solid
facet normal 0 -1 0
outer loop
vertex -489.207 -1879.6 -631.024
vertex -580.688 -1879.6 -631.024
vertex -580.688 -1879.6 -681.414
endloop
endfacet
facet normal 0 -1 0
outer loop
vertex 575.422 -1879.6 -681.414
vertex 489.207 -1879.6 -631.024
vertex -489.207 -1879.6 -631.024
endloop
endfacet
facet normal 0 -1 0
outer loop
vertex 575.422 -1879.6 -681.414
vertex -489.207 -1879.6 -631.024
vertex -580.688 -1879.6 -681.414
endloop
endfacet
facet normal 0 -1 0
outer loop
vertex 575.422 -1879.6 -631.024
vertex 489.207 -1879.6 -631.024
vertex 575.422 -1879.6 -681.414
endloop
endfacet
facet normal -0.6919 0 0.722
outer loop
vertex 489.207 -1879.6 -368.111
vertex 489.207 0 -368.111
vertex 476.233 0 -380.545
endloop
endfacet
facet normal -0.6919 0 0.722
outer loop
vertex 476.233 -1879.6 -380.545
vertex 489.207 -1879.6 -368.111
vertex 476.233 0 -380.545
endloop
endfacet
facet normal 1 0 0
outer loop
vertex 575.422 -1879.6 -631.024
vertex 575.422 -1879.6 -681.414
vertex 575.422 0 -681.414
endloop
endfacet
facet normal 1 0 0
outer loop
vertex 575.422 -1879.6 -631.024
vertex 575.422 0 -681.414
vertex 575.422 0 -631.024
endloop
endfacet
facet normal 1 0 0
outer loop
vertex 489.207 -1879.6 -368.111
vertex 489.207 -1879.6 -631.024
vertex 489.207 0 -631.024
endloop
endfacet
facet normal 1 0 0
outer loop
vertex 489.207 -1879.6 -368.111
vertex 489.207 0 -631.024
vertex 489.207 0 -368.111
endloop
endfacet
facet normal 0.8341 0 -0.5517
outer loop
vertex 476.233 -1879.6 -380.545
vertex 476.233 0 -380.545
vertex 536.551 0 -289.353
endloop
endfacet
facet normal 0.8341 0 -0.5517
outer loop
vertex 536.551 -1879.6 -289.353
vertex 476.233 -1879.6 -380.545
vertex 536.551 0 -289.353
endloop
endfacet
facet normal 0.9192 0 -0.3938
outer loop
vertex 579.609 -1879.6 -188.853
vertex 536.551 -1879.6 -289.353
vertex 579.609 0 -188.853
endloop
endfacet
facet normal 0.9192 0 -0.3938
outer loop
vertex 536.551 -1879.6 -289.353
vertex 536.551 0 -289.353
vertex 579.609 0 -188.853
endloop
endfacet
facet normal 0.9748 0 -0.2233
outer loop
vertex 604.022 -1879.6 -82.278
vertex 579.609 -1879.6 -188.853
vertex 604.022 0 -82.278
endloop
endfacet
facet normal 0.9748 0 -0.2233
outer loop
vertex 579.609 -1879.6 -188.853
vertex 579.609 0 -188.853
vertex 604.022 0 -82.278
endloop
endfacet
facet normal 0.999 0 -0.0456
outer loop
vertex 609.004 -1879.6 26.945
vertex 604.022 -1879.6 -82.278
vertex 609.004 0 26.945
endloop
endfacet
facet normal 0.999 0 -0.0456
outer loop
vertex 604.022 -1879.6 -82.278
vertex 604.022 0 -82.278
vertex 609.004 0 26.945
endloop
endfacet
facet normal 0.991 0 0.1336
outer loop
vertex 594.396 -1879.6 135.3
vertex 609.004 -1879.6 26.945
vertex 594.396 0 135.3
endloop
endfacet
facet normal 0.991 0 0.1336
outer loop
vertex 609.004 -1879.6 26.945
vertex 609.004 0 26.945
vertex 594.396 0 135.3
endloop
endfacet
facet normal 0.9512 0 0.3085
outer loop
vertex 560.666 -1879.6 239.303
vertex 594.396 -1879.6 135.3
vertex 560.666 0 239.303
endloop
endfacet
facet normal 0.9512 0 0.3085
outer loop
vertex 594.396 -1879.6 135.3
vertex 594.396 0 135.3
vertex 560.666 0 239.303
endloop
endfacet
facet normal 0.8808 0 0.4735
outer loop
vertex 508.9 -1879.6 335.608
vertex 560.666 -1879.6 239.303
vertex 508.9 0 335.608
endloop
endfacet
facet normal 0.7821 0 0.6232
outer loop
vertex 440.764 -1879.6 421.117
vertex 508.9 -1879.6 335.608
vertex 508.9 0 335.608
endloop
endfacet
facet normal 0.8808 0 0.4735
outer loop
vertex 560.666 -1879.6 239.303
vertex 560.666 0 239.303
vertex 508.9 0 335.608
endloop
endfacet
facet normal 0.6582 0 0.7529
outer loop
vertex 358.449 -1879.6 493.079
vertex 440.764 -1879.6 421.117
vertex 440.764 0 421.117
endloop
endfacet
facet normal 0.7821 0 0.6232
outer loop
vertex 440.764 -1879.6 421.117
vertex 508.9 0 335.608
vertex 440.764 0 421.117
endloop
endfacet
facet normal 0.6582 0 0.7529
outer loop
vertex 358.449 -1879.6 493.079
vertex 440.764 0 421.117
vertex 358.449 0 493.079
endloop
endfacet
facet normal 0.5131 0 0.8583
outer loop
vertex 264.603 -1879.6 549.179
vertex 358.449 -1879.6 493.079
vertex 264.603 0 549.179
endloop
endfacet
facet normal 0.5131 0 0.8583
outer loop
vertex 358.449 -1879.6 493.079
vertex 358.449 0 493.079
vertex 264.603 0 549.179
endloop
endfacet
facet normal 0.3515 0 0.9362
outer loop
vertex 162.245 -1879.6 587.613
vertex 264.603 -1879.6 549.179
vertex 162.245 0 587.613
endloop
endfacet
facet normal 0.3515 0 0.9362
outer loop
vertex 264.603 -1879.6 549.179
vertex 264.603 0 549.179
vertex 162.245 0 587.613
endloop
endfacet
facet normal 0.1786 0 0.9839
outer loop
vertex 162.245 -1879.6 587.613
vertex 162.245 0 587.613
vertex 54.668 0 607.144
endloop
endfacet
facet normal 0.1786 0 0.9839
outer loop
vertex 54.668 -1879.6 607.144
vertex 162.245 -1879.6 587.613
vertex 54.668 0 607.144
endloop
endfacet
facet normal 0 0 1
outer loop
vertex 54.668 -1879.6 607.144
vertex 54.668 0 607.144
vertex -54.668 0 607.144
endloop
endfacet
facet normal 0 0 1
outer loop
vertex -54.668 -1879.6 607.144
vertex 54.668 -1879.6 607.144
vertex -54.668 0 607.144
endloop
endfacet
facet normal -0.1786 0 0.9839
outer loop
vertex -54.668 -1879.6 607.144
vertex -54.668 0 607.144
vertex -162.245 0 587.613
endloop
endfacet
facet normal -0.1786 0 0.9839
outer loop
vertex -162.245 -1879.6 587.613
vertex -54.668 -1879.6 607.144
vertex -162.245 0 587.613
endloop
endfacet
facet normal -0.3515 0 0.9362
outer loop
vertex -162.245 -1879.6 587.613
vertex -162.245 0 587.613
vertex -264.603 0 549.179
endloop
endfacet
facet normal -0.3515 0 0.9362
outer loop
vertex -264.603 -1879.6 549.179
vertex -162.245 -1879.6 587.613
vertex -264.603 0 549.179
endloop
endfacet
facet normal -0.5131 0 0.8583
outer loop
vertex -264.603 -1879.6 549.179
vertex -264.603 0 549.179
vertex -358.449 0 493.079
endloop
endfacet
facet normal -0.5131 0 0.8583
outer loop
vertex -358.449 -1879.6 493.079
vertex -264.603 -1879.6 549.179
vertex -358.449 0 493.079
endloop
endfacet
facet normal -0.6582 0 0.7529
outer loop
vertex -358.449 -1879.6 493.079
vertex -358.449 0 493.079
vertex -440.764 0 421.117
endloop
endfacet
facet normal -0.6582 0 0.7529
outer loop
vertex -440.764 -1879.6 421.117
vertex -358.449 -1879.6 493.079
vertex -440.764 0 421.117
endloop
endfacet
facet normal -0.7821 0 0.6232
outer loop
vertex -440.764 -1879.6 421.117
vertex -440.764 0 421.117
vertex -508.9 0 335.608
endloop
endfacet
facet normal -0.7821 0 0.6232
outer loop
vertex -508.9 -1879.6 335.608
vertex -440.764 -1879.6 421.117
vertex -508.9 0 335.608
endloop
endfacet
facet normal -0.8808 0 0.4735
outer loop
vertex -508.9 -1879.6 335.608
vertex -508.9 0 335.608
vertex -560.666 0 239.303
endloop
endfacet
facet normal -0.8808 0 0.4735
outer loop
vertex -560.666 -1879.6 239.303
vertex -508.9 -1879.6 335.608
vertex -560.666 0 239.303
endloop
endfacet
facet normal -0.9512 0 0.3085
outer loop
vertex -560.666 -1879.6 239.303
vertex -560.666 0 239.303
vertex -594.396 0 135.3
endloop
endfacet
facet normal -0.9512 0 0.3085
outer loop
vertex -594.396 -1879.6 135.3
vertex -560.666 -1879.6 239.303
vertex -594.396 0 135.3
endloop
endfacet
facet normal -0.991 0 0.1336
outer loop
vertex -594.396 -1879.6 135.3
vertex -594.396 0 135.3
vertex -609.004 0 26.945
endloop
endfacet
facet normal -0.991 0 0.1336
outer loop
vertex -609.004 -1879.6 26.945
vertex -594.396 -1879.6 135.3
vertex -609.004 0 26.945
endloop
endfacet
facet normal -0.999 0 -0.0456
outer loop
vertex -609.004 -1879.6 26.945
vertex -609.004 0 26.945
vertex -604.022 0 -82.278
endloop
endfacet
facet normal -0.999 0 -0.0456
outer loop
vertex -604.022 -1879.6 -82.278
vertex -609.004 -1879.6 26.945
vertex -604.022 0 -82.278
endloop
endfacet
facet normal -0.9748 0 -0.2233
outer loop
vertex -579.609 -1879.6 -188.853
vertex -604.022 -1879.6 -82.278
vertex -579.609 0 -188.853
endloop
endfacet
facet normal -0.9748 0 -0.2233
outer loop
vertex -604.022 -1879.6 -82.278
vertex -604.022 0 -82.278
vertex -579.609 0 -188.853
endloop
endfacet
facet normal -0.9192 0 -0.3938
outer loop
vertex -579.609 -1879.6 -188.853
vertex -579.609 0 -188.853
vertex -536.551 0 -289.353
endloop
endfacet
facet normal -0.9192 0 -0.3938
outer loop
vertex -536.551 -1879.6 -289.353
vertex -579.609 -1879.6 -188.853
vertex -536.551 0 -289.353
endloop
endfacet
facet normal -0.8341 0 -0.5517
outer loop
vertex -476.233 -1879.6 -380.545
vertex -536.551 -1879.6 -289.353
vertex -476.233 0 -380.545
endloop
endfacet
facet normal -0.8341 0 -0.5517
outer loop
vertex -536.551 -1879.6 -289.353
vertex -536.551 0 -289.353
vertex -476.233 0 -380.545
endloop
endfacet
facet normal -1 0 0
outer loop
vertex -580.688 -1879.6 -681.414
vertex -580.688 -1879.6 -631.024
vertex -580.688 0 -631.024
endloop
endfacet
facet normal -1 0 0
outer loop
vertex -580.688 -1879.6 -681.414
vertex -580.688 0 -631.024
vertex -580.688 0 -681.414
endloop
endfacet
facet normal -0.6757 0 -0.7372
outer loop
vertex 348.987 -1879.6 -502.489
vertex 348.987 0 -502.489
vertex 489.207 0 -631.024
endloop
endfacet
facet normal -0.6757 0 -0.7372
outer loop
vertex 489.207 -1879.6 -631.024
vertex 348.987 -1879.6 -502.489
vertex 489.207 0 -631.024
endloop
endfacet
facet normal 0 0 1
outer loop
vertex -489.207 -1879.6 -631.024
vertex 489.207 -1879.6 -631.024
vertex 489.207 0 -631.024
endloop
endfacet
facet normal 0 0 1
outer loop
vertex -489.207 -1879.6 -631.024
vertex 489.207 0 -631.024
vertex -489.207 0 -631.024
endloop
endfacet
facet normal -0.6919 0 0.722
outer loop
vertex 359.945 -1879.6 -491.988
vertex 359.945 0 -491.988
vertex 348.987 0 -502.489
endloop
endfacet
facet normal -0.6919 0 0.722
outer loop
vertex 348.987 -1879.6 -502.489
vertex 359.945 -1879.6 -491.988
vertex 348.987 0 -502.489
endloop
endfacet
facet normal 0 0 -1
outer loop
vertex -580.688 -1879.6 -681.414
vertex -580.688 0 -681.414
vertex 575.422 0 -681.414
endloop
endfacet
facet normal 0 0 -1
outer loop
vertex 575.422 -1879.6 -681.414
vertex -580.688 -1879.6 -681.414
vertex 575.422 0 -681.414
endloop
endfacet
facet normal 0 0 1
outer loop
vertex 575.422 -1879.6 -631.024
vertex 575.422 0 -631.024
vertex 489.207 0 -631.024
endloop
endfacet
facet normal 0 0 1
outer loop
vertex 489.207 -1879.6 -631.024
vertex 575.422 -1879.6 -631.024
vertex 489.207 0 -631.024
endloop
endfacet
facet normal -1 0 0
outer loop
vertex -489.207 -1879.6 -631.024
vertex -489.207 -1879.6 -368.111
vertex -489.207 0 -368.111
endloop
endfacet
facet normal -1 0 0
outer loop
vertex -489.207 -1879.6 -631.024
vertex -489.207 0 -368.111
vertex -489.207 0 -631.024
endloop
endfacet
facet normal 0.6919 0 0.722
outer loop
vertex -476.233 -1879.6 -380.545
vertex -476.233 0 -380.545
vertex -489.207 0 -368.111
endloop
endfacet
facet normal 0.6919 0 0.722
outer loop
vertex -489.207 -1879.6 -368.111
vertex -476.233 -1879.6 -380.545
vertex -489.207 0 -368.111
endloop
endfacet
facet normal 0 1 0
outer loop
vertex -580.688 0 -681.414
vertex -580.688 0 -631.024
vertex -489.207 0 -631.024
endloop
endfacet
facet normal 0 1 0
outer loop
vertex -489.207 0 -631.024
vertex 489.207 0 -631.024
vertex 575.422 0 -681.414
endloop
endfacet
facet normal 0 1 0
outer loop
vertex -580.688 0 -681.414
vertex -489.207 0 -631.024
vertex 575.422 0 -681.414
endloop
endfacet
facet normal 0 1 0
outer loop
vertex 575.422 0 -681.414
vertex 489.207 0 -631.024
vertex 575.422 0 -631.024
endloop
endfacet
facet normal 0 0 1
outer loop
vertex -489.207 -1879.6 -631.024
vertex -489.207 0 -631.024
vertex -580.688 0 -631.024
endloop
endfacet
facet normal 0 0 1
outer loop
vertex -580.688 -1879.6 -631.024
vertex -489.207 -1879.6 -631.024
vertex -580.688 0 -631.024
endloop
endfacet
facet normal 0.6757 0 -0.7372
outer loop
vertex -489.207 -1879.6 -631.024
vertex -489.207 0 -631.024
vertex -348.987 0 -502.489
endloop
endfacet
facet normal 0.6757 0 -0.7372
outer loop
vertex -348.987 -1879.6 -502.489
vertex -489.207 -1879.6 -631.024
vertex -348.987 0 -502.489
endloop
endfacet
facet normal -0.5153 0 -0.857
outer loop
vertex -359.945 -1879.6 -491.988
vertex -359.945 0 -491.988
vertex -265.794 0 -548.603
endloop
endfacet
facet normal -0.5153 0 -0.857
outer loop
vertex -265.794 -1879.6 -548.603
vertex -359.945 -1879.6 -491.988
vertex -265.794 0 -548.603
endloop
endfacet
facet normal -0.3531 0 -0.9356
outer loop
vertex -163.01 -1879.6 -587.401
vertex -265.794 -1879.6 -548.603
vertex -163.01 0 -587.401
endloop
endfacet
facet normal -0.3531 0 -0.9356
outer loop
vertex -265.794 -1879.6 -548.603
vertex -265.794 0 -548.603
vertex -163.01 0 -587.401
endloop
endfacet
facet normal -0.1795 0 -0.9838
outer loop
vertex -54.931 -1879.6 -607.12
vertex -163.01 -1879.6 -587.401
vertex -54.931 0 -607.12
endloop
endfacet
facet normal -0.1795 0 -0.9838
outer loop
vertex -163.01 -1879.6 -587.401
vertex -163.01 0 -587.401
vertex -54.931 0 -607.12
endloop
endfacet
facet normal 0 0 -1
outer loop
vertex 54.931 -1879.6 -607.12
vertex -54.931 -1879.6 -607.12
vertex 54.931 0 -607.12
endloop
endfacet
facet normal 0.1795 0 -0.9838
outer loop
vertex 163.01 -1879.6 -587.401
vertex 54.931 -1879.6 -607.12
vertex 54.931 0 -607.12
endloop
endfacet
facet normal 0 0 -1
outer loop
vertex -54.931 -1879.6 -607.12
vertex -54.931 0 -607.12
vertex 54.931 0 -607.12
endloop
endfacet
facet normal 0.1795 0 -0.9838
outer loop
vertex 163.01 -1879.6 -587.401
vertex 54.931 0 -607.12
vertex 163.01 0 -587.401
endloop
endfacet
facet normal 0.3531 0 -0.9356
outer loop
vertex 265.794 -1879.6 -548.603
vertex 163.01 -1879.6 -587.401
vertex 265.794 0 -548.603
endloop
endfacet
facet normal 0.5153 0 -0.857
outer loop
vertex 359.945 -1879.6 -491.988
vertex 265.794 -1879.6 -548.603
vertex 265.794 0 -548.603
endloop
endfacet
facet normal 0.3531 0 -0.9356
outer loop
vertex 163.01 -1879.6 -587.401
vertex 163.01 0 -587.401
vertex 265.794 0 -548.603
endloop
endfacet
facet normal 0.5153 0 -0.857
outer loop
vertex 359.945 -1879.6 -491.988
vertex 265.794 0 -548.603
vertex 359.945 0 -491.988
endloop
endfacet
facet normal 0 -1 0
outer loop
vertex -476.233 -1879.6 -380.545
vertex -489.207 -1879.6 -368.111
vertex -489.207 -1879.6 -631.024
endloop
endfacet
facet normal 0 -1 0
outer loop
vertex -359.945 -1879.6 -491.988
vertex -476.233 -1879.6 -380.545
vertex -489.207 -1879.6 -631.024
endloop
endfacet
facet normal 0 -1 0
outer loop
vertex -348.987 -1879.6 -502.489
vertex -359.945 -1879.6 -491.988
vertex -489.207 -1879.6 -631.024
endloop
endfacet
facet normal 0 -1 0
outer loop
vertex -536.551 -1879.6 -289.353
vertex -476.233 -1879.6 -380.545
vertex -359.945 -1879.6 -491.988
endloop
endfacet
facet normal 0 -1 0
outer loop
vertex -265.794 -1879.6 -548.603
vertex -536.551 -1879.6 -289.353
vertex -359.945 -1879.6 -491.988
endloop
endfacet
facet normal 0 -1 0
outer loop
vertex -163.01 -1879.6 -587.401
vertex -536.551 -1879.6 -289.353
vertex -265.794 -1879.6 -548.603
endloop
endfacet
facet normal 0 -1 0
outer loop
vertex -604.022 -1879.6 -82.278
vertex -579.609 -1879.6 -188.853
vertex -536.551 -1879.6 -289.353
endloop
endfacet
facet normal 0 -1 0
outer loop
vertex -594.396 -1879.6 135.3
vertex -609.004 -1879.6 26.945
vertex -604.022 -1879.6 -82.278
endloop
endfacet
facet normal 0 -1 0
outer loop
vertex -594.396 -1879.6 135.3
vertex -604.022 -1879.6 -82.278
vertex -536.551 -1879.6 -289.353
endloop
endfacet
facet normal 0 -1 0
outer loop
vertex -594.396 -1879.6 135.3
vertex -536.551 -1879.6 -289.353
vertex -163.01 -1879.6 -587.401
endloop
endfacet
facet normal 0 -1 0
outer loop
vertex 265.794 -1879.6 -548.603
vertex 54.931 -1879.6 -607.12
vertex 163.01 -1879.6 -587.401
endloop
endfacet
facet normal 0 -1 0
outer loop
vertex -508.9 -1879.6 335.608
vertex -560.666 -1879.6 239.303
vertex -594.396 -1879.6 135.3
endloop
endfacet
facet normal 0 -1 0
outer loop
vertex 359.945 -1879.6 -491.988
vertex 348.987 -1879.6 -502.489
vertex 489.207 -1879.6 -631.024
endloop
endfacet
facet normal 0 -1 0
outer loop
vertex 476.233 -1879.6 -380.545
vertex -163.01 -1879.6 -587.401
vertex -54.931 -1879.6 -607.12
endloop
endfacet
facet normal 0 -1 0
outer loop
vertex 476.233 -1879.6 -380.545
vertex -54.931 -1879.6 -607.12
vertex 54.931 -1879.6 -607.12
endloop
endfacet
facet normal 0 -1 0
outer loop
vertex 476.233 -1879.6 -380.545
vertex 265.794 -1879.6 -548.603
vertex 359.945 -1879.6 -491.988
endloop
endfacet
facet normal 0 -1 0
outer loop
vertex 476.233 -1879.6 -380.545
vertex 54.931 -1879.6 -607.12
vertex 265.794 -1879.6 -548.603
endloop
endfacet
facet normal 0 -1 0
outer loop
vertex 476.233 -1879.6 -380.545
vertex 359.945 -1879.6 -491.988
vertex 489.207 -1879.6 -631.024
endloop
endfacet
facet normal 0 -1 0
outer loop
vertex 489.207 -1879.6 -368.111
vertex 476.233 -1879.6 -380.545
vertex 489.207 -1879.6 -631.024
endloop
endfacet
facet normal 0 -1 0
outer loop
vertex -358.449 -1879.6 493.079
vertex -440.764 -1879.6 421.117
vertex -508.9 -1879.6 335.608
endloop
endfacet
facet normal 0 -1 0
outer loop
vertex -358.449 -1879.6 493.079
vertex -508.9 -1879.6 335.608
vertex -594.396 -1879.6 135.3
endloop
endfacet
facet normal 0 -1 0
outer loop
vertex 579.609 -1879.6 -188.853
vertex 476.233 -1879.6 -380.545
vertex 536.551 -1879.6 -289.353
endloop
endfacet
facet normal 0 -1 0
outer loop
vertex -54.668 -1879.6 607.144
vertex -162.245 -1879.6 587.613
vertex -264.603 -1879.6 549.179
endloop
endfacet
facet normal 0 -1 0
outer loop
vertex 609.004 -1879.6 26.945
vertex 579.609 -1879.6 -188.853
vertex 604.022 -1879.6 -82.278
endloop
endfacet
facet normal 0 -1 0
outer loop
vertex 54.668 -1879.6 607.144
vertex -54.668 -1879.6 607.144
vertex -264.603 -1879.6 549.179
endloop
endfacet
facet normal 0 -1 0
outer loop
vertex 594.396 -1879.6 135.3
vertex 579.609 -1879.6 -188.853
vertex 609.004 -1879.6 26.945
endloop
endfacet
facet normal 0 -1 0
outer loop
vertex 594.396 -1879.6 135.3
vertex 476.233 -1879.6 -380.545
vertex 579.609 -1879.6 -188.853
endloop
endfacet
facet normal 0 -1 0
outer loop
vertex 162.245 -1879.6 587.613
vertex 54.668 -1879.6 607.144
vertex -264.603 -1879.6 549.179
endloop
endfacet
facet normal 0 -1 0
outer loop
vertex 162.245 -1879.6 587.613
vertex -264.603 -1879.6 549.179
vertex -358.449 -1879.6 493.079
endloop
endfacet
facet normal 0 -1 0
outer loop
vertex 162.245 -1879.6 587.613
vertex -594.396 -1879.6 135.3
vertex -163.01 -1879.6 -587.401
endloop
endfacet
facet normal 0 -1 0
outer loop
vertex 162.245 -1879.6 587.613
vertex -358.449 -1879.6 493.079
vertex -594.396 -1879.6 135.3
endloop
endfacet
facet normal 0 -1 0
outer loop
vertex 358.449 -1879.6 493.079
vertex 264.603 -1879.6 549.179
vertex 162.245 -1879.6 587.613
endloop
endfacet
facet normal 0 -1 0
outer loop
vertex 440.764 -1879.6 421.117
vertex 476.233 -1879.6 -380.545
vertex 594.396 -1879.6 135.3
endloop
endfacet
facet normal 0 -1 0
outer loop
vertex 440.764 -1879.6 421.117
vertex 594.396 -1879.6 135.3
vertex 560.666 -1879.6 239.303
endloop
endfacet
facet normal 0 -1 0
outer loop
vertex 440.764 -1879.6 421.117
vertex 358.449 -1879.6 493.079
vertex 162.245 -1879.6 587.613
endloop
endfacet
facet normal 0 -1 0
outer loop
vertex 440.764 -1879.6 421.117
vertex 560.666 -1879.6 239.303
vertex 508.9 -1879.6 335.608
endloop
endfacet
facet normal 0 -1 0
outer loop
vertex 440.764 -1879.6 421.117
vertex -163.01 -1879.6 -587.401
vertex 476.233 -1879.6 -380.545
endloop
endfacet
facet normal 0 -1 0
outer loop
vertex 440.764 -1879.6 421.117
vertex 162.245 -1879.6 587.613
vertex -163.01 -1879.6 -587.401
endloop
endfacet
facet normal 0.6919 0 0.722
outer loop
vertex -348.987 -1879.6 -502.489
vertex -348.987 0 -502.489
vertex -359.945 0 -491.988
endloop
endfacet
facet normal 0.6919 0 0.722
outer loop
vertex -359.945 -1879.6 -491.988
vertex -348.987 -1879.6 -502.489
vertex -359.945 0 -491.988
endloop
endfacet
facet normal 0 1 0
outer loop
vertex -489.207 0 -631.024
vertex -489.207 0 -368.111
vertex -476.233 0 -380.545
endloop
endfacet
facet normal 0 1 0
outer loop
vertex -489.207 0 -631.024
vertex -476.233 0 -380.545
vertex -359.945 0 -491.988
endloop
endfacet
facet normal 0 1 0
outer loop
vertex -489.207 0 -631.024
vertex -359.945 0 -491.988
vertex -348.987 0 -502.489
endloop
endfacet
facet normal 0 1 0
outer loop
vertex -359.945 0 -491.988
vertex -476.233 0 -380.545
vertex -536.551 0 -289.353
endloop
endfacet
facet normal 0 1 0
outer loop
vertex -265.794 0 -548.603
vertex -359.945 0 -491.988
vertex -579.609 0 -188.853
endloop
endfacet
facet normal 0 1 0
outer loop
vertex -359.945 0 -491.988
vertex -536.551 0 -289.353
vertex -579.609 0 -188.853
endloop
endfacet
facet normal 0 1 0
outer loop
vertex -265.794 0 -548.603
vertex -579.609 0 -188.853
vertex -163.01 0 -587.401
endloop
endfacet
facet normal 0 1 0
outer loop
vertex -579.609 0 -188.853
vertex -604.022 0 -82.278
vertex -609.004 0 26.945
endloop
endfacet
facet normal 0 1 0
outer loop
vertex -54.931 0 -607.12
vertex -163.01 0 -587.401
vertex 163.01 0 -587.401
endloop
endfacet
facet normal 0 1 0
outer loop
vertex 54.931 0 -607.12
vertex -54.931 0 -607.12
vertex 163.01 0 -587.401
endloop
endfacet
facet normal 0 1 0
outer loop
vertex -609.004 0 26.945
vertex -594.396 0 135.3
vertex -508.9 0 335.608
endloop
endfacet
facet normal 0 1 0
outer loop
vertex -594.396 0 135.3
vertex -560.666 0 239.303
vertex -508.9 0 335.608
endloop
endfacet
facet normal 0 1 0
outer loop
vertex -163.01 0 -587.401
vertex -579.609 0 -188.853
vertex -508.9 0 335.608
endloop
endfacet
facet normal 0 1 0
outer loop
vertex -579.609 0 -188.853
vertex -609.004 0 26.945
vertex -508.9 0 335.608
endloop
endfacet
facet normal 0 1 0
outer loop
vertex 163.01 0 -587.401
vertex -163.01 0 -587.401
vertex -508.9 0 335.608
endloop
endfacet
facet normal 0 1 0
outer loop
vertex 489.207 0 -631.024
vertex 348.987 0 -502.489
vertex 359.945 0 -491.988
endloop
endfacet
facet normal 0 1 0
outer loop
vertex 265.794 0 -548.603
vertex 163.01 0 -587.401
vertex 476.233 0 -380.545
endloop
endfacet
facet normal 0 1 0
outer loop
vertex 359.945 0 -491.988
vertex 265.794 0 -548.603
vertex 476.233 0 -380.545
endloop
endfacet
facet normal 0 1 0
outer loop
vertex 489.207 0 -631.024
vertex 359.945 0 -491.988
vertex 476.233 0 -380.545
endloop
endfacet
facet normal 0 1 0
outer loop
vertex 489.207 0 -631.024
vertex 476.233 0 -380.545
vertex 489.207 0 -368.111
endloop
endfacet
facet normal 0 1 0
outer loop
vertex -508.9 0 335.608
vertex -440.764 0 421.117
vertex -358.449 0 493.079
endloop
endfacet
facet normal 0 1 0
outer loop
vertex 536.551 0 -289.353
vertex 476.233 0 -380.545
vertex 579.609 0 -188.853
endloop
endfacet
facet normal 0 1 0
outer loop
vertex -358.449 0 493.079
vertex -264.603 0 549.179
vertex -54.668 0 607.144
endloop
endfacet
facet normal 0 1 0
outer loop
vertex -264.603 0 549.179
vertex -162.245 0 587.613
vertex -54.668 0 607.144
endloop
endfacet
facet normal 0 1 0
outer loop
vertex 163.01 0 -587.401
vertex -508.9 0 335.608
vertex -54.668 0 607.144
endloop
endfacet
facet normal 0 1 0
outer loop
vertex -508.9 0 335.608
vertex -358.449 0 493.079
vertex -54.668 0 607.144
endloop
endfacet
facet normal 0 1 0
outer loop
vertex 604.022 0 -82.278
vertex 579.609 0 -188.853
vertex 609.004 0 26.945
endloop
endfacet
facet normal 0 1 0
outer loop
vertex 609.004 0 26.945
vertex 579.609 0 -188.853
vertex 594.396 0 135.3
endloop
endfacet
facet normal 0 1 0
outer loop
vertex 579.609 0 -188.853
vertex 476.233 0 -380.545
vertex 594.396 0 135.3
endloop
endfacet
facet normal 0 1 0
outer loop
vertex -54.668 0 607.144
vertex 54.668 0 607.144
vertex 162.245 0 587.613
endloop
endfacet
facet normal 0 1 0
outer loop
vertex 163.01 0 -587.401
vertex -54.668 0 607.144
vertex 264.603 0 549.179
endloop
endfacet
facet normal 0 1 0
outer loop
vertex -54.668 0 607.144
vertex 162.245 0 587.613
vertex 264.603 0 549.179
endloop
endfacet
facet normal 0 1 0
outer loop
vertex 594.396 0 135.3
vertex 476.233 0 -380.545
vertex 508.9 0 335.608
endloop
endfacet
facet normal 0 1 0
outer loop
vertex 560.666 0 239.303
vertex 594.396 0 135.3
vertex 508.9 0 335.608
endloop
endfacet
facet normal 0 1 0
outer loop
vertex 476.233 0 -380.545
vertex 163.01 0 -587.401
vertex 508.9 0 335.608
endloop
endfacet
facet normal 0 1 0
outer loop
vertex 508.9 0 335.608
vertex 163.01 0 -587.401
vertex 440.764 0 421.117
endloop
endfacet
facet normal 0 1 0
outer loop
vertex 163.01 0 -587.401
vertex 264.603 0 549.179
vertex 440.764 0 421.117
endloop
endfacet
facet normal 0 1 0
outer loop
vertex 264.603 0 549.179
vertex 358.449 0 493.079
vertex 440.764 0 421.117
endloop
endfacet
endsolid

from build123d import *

# Parameters (mm, degrees)
F0_R     = 609.6
F1_DEPTH = 1879.6
F3_DEPTH = 1879.6


with BuildPart() as f1:
    # F0 (on Front) → F1 (new body)
    with BuildSketch(Plane.XZ):
        Circle(F0_R)
    extrude(amount=F1_DEPTH)

    # F2 (on Front) → F3 (join)
    with BuildSketch(Plane.XZ):
        Polygon((-348.987311, -502.488673), (-489.207476, -368.110985), (-489.207476, -631.023824), align=None)
        Polygon((348.987311, -502.488673), (489.207476, -631.023824), (489.207476, -368.110985), align=None)
        Polygon((489.207476, -631.023824), (-489.207476, -631.023824), (-580.687582, -631.023824), (-580.687582, -681.413651), (575.422287, -681.413651), (575.422287, -631.023824), align=None)
    extrude(amount=F3_DEPTH)


solid = f1.part
